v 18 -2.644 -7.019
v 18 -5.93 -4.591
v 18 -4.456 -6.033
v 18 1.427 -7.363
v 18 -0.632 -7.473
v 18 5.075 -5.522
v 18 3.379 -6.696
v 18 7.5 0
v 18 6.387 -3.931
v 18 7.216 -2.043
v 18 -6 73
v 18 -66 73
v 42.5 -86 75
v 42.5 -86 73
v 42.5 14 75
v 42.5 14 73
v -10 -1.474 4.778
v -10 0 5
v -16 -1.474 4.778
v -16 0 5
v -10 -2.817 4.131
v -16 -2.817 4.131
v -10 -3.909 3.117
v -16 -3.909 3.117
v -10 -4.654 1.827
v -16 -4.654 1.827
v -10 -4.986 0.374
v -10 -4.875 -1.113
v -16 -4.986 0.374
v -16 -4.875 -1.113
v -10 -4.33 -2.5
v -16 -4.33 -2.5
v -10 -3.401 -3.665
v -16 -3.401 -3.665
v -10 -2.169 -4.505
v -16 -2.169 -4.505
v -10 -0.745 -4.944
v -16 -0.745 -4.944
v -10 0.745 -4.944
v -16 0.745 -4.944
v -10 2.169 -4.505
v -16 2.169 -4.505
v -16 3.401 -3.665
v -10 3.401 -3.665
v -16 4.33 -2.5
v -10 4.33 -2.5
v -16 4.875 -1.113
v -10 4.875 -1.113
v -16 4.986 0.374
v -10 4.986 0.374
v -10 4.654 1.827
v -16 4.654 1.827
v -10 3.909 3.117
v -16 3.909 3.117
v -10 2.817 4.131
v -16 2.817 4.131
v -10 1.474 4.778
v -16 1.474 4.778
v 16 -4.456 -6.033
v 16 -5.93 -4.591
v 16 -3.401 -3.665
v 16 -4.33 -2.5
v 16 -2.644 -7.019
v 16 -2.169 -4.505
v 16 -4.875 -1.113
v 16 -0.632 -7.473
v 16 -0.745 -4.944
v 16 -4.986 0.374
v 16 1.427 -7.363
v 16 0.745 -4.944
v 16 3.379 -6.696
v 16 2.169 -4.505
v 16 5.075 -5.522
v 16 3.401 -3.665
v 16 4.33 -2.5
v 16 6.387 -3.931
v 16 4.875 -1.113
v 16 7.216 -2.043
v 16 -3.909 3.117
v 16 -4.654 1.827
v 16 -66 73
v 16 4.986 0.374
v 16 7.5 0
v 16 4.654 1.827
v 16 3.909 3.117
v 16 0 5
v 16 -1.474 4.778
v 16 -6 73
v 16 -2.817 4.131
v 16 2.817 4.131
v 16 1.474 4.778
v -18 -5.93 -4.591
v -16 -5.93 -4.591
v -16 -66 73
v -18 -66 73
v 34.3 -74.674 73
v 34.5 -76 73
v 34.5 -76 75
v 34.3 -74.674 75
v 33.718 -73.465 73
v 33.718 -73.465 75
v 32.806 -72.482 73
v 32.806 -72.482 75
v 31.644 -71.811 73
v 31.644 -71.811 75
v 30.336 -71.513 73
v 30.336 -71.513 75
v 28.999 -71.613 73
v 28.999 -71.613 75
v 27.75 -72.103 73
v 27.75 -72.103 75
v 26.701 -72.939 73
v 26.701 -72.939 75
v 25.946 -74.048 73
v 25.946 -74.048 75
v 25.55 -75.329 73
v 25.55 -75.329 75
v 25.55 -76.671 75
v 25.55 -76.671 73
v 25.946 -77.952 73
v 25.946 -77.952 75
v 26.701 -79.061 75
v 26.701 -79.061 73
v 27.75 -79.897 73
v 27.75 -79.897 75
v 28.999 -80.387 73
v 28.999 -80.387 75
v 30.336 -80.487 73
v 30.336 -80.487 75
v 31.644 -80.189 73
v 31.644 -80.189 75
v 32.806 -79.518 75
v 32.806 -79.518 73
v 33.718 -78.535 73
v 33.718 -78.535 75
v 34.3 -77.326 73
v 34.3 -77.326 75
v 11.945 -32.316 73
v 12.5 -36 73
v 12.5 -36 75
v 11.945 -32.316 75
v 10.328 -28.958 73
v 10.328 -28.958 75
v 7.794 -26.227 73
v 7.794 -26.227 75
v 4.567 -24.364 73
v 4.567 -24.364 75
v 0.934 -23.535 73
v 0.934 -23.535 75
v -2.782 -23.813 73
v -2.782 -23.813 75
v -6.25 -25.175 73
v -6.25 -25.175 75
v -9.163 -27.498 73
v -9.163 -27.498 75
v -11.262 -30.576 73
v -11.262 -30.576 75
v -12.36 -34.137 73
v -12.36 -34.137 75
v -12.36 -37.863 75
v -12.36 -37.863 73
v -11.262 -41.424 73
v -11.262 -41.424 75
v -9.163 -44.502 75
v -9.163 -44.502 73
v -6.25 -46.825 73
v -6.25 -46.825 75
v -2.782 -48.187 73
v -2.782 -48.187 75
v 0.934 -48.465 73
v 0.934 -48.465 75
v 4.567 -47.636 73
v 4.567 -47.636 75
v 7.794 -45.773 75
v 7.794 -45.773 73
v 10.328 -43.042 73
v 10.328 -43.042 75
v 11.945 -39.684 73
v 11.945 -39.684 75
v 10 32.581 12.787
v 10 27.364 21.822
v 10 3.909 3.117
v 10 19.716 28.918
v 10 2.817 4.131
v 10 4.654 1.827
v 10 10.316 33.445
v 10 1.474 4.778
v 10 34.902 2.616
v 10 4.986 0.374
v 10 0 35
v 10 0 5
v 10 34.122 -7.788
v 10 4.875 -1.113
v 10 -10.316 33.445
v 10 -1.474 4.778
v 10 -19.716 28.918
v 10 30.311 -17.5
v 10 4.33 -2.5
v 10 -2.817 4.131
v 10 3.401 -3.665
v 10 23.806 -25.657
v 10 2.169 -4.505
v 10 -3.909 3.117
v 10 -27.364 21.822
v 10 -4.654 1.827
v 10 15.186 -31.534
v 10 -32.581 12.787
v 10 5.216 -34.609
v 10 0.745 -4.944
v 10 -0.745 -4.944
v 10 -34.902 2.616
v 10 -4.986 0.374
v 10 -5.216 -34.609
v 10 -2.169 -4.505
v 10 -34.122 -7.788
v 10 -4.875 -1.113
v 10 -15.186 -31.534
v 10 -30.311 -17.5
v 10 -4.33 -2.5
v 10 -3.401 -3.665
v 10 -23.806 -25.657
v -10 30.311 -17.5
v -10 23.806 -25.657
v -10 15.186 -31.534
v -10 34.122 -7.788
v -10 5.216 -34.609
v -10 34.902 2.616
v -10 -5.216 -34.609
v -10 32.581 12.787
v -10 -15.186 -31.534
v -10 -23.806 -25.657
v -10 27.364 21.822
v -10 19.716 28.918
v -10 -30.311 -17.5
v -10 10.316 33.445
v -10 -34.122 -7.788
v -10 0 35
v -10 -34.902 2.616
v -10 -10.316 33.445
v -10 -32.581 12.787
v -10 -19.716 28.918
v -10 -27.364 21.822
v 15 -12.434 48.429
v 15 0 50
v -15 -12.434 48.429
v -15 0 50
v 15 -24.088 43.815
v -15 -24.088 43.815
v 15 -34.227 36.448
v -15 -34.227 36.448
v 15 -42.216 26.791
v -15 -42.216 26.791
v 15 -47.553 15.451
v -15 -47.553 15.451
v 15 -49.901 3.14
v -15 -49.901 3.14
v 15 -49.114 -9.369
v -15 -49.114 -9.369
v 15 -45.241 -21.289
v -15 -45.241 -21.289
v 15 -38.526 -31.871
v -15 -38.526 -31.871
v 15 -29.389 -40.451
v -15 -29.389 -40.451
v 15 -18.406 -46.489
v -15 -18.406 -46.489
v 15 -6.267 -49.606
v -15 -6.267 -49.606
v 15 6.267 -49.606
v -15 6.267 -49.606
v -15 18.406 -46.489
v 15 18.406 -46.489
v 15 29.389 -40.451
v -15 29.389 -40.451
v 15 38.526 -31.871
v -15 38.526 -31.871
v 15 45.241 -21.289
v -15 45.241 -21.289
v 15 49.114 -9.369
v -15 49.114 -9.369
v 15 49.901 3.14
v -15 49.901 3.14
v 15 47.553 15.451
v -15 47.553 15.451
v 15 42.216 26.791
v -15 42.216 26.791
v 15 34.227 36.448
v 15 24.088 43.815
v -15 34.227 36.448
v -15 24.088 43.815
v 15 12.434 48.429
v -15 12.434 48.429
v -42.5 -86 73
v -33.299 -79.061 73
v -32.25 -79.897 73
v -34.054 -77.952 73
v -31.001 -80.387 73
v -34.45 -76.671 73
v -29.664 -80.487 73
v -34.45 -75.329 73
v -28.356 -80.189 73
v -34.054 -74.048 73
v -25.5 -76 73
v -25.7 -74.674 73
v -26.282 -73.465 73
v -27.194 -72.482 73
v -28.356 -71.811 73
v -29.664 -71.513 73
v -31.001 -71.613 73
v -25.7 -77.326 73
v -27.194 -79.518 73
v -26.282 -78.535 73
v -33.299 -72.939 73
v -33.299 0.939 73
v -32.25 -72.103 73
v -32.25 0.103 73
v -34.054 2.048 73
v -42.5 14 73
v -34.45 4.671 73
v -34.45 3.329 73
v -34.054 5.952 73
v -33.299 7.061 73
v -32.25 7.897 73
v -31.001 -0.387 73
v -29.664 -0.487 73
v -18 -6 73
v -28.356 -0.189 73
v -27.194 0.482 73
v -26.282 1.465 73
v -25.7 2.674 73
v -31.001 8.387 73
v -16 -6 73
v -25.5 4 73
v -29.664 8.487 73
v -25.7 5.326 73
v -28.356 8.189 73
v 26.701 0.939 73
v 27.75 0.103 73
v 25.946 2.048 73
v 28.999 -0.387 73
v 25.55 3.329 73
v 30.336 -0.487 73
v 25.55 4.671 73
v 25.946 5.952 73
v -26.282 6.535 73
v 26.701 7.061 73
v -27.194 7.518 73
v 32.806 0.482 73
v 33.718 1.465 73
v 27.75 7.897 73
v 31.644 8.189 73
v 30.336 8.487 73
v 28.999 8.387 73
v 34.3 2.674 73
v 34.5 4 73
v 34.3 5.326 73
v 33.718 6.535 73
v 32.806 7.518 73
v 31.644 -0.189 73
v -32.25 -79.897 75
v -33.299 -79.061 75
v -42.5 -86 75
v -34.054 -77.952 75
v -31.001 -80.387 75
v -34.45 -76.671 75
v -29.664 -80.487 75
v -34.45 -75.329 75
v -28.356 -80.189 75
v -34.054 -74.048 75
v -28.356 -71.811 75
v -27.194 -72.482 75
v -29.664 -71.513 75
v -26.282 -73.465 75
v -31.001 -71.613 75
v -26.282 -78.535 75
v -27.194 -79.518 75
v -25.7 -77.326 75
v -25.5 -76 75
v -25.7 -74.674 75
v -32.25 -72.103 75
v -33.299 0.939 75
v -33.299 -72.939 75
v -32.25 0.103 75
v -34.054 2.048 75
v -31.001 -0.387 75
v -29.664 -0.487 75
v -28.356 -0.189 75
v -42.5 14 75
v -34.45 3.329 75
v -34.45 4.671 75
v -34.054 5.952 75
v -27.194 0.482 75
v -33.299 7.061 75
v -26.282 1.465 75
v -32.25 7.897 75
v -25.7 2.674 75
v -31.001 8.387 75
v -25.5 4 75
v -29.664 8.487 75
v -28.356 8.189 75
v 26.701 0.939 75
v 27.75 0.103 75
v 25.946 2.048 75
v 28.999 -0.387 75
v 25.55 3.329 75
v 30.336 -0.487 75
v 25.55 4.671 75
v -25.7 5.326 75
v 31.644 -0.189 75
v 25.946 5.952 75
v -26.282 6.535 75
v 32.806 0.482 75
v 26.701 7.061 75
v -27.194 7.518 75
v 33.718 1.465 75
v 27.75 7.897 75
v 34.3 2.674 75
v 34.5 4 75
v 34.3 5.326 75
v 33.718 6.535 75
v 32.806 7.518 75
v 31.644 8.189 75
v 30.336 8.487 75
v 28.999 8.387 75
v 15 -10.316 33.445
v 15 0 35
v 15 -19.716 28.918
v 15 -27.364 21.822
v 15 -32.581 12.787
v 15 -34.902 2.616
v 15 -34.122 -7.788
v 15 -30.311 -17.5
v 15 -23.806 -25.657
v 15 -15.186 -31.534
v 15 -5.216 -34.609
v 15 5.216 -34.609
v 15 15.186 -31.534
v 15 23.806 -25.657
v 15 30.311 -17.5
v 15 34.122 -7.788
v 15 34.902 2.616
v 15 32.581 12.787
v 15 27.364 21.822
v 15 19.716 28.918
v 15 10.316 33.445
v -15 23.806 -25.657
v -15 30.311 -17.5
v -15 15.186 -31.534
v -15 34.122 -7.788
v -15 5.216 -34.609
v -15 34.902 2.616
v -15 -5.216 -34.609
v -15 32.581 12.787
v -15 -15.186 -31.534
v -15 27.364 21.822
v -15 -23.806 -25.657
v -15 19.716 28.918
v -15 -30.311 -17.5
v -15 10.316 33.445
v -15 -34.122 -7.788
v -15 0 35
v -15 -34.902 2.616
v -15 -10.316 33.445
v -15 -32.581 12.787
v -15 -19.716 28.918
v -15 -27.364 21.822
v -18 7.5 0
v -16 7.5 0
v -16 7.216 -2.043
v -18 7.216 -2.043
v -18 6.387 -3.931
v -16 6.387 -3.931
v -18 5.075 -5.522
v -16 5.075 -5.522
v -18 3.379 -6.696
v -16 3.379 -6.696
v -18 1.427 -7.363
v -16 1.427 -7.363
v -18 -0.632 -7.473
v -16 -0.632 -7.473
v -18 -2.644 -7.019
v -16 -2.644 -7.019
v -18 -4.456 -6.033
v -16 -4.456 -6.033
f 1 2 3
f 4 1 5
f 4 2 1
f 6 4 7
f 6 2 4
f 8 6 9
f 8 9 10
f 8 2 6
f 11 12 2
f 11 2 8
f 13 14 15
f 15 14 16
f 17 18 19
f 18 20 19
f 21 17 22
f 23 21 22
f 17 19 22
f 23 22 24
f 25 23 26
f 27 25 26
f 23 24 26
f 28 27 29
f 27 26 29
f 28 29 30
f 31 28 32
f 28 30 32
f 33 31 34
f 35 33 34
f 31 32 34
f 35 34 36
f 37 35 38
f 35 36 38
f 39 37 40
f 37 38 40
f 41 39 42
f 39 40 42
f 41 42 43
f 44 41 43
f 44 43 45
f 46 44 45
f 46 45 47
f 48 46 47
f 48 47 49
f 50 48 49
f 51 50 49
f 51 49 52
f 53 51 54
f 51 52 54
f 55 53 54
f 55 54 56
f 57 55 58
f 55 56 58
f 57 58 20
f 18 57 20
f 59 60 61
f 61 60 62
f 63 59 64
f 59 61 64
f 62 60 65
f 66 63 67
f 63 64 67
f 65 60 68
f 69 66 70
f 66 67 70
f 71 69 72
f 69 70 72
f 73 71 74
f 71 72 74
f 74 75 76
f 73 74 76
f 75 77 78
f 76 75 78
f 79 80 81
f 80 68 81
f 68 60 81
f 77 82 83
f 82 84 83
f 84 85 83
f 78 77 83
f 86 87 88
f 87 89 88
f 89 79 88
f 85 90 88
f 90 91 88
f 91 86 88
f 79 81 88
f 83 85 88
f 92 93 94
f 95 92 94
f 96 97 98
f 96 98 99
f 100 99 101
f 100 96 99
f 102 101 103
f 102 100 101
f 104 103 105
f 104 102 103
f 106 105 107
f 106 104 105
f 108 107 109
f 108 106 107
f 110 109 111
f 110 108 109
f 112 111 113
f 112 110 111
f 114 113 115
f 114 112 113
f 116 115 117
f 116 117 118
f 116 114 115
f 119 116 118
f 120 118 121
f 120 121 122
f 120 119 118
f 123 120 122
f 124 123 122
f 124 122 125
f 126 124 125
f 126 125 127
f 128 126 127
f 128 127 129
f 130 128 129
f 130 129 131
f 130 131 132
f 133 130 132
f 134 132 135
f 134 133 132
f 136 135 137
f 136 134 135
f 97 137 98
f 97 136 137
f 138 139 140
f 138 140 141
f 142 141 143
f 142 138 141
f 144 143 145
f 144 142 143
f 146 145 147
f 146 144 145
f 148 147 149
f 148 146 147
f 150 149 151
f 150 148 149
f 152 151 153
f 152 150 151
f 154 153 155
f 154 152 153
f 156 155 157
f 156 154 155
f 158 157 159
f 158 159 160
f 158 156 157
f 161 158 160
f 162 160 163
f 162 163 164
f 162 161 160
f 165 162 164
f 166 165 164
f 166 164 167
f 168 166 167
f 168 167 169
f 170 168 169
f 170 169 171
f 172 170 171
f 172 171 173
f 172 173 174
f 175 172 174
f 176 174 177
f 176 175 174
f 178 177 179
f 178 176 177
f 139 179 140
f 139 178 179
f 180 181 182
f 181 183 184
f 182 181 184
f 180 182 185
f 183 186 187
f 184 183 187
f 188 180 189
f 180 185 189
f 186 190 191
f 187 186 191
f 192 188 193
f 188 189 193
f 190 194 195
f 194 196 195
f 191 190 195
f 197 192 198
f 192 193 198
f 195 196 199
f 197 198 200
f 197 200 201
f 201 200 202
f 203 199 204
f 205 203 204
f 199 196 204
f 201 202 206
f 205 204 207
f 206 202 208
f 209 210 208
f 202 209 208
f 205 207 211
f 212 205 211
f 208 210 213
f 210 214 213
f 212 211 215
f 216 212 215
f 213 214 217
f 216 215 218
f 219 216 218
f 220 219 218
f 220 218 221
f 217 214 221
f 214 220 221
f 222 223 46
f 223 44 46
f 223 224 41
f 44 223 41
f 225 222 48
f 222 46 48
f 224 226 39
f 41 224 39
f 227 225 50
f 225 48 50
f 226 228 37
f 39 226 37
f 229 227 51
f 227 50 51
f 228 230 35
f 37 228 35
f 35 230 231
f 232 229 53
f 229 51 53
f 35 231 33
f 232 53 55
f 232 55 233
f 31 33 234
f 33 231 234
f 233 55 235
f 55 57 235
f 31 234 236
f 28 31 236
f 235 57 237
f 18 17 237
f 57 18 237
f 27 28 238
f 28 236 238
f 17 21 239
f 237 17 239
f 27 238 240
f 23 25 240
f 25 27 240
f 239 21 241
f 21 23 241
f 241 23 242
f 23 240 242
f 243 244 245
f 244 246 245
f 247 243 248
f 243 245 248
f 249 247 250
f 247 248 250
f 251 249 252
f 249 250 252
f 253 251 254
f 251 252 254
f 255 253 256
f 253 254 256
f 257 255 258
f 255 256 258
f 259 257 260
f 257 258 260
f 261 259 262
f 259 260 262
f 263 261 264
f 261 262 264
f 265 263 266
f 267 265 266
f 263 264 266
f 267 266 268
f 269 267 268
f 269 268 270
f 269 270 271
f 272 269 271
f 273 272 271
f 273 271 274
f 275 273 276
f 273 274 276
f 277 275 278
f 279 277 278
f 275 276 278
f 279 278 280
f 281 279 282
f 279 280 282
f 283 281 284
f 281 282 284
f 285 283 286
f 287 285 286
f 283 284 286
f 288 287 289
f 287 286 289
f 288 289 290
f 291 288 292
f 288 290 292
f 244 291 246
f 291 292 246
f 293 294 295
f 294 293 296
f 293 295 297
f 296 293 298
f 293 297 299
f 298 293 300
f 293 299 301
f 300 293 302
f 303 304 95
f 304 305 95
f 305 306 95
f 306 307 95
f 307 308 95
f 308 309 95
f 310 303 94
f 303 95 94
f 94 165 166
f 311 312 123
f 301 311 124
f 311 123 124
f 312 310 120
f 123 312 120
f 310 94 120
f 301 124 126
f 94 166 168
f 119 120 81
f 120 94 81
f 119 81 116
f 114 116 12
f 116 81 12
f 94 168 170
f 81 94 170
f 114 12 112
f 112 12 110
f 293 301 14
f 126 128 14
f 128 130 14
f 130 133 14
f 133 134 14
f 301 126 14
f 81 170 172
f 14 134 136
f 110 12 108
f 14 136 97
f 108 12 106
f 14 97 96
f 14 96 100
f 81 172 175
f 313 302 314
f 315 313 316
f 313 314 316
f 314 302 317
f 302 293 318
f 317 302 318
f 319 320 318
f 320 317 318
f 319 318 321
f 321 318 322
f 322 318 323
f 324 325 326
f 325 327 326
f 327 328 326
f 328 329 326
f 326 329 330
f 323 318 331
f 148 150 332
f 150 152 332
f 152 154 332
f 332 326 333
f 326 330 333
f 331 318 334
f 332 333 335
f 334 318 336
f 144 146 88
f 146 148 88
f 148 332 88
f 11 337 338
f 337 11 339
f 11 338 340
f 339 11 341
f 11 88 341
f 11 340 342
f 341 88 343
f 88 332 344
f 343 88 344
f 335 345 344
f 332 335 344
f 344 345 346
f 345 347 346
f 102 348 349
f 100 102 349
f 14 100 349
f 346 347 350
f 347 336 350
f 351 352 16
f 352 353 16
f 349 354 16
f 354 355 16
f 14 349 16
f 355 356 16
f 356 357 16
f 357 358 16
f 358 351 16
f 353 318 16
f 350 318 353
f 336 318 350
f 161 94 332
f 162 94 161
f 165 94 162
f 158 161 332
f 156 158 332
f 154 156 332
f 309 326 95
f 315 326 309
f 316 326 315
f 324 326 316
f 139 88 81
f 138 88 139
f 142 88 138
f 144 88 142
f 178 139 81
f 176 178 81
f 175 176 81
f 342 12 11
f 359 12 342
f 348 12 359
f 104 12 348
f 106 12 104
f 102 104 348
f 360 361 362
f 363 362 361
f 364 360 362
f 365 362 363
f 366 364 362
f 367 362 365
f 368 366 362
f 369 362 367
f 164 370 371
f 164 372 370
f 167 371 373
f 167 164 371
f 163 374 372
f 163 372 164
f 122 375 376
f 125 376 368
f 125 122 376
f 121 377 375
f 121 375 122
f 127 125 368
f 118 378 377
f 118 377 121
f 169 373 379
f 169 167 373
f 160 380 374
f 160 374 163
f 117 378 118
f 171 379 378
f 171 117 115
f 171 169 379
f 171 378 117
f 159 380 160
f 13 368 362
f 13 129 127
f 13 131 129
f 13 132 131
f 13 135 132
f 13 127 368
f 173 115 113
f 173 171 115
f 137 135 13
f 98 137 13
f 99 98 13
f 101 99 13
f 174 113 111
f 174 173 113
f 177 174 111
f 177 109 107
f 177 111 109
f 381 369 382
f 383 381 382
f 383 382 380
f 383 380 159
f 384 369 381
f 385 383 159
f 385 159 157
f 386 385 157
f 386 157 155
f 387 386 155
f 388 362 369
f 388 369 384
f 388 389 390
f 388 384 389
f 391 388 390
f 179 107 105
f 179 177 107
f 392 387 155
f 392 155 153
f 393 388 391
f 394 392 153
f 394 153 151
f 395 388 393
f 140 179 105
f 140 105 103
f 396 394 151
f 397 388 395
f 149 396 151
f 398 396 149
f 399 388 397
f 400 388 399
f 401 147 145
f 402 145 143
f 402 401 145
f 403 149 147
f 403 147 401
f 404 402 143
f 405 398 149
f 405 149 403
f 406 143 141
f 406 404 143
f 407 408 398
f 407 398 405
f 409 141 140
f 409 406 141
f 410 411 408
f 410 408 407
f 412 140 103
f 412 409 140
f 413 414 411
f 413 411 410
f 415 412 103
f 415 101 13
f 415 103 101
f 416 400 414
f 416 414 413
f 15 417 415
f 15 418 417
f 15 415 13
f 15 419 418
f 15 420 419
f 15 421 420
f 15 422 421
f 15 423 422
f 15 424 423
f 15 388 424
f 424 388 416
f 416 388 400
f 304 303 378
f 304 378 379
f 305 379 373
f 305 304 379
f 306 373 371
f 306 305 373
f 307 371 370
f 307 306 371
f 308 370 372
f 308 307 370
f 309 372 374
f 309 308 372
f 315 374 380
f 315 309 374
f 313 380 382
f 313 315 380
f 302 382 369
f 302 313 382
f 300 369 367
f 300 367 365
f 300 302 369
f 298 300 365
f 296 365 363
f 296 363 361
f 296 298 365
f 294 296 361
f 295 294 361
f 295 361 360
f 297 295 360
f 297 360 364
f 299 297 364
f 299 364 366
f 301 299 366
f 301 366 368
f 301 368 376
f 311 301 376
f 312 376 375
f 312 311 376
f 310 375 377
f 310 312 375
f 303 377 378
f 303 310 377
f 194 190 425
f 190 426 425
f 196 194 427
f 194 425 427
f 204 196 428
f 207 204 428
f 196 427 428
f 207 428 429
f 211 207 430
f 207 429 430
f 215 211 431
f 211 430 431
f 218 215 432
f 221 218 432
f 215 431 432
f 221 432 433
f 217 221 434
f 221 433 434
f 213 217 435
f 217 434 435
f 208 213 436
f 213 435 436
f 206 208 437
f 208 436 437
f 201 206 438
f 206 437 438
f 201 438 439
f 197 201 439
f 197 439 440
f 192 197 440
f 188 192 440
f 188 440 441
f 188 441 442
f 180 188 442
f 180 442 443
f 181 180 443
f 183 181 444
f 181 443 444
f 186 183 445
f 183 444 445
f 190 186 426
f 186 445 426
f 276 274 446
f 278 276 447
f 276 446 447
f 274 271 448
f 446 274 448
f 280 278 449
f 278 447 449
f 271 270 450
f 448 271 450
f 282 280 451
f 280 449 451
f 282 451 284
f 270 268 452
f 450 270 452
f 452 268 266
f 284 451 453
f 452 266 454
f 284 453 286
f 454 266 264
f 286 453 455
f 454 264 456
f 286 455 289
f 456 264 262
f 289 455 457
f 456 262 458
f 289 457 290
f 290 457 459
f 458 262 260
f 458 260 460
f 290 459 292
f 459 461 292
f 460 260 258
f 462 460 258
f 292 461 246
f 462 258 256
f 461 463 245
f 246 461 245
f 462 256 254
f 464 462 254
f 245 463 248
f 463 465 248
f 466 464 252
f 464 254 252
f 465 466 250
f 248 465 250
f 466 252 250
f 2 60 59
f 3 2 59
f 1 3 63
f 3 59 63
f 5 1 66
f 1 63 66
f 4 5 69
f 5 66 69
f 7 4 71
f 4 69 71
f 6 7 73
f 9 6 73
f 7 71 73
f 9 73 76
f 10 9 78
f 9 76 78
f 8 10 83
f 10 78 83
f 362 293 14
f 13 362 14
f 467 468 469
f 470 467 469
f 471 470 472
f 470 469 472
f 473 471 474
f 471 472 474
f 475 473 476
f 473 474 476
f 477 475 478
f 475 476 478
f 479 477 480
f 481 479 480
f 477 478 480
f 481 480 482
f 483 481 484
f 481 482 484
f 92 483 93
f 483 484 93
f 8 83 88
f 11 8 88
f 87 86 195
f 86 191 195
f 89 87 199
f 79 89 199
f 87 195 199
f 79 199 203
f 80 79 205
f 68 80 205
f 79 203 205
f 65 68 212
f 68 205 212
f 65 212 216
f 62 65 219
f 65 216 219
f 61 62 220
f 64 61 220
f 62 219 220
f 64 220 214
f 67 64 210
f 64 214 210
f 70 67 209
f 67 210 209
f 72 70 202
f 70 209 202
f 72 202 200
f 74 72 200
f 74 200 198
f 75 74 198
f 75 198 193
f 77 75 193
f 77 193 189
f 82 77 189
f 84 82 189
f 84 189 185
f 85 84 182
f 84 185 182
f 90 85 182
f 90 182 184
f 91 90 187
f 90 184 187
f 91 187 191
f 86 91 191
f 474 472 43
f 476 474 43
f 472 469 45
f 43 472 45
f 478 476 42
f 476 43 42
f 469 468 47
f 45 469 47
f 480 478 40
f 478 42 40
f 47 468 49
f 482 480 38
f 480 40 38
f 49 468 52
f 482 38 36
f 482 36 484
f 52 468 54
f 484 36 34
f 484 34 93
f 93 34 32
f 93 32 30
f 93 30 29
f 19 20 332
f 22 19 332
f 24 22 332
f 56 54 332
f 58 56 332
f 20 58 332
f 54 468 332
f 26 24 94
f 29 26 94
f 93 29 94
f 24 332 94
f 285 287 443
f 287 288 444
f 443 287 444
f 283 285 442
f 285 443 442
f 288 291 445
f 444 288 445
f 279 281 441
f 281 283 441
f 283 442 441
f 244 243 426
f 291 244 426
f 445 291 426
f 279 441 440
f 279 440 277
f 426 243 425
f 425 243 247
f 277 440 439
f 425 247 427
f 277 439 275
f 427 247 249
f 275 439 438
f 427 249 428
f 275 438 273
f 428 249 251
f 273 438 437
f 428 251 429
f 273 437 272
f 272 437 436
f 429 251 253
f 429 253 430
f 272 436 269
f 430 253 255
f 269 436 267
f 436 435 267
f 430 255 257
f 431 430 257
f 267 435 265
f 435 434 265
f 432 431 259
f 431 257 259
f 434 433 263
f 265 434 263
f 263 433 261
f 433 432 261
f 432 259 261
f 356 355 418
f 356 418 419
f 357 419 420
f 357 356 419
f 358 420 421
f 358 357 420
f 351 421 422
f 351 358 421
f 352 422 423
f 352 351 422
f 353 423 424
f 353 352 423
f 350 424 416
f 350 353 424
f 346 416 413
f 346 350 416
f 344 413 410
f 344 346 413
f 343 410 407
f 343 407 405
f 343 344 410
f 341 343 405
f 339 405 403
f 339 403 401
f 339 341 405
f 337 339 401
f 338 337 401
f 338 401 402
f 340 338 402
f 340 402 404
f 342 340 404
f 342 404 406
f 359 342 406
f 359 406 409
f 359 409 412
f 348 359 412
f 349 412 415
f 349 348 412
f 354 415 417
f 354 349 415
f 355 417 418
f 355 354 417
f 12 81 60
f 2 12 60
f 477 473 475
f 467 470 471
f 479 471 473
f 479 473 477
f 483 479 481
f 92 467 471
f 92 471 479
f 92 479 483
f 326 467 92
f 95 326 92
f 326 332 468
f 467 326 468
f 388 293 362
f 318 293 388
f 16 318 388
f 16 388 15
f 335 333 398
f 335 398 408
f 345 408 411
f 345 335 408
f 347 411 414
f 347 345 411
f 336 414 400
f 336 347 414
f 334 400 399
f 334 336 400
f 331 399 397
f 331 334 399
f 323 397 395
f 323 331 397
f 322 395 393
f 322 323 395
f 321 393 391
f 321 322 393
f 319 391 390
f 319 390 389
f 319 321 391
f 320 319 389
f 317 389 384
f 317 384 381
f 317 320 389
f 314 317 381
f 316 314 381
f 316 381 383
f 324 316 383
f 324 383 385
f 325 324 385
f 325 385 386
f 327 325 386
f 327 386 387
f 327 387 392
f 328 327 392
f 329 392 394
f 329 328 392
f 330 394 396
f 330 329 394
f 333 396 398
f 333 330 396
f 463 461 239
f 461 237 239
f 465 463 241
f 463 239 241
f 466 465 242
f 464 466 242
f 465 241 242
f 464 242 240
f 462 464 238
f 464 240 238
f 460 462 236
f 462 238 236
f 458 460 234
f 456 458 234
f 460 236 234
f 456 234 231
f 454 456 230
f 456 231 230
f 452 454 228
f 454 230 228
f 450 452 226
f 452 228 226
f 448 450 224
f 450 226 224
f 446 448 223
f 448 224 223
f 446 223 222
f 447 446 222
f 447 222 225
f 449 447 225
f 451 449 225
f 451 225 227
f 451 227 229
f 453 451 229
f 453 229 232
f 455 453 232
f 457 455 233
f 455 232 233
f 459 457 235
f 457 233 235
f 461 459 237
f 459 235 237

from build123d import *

# Parameters (mm, degrees)
F3_DEPTH = 2
F5_DEPTH = 2
F6_W     = 85
F6_H     = 100
F6_R     = 4.5
F6_R_2   = 12.5
F7_DEPTH = 2


with BuildPart() as f1:
    # F0 (on Front) → F1 (revolve)
    with BuildSketch(Plane.XZ):
        Polygon((16, 5), (10, 5), (10, 35), (15, 35), (15, 50), (-15, 50), (-15, 35), (-10, 35), (-10, 5), (-16, 5), (-16, 0), (16, 0), align=None)
    revolve(axis=Axis((0, 0, 0), (1, 0, 0)))

    # F2 (on face) → F3 (join)
    with BuildSketch(Plane(origin=(-16, 0, 0), x_dir=(0, -1, 0), z_dir=(-1, 0, 0))):
        with BuildLine():
            Line((6, 73), (-7.5, 0))
            ThreePointArc((-7.5, 0), (-2.426055, -7.096778), (5.930469, -4.591246))
            Line((5.930469, -4.591246), (66, 73))
            Line((66, 73), (6, 73))
        make_face()
    extrude(amount=F3_DEPTH)

    # F4 (on face) → F5 (join)
    with BuildSketch(Plane.YZ.offset(16)):
        with BuildLine():
            ThreePointArc((-5.930469, -4.591246), (2.426055, -7.096778), (7.5, 0))
            Line((7.5, 0), (-6, 73))
            Line((-6, 73), (-66, 73))
            Line((-66, 73), (-5.930469, -4.591246))
        make_face()
    extrude(amount=F5_DEPTH)

    # F6 (on face) → F7 (join)
    with BuildSketch(Plane.XY.offset(73)):
        with Locations((0, -36)):
            Rectangle(F6_W, F6_H)
        with Locations((-30, -76)):
            Circle(F6_R, mode=Mode.SUBTRACT)
        with Locations((30, -76)):
            Circle(F6_R, mode=Mode.SUBTRACT)
        with Locations((-30, 4)):
            Circle(F6_R, mode=Mode.SUBTRACT)
        with Locations((0, -36)):
            Circle(F6_R_2, mode=Mode.SUBTRACT)
        with Locations((30, 4)):
            Circle(F6_R, mode=Mode.SUBTRACT)
    extrude(amount=F7_DEPTH)


solid = f1.part
